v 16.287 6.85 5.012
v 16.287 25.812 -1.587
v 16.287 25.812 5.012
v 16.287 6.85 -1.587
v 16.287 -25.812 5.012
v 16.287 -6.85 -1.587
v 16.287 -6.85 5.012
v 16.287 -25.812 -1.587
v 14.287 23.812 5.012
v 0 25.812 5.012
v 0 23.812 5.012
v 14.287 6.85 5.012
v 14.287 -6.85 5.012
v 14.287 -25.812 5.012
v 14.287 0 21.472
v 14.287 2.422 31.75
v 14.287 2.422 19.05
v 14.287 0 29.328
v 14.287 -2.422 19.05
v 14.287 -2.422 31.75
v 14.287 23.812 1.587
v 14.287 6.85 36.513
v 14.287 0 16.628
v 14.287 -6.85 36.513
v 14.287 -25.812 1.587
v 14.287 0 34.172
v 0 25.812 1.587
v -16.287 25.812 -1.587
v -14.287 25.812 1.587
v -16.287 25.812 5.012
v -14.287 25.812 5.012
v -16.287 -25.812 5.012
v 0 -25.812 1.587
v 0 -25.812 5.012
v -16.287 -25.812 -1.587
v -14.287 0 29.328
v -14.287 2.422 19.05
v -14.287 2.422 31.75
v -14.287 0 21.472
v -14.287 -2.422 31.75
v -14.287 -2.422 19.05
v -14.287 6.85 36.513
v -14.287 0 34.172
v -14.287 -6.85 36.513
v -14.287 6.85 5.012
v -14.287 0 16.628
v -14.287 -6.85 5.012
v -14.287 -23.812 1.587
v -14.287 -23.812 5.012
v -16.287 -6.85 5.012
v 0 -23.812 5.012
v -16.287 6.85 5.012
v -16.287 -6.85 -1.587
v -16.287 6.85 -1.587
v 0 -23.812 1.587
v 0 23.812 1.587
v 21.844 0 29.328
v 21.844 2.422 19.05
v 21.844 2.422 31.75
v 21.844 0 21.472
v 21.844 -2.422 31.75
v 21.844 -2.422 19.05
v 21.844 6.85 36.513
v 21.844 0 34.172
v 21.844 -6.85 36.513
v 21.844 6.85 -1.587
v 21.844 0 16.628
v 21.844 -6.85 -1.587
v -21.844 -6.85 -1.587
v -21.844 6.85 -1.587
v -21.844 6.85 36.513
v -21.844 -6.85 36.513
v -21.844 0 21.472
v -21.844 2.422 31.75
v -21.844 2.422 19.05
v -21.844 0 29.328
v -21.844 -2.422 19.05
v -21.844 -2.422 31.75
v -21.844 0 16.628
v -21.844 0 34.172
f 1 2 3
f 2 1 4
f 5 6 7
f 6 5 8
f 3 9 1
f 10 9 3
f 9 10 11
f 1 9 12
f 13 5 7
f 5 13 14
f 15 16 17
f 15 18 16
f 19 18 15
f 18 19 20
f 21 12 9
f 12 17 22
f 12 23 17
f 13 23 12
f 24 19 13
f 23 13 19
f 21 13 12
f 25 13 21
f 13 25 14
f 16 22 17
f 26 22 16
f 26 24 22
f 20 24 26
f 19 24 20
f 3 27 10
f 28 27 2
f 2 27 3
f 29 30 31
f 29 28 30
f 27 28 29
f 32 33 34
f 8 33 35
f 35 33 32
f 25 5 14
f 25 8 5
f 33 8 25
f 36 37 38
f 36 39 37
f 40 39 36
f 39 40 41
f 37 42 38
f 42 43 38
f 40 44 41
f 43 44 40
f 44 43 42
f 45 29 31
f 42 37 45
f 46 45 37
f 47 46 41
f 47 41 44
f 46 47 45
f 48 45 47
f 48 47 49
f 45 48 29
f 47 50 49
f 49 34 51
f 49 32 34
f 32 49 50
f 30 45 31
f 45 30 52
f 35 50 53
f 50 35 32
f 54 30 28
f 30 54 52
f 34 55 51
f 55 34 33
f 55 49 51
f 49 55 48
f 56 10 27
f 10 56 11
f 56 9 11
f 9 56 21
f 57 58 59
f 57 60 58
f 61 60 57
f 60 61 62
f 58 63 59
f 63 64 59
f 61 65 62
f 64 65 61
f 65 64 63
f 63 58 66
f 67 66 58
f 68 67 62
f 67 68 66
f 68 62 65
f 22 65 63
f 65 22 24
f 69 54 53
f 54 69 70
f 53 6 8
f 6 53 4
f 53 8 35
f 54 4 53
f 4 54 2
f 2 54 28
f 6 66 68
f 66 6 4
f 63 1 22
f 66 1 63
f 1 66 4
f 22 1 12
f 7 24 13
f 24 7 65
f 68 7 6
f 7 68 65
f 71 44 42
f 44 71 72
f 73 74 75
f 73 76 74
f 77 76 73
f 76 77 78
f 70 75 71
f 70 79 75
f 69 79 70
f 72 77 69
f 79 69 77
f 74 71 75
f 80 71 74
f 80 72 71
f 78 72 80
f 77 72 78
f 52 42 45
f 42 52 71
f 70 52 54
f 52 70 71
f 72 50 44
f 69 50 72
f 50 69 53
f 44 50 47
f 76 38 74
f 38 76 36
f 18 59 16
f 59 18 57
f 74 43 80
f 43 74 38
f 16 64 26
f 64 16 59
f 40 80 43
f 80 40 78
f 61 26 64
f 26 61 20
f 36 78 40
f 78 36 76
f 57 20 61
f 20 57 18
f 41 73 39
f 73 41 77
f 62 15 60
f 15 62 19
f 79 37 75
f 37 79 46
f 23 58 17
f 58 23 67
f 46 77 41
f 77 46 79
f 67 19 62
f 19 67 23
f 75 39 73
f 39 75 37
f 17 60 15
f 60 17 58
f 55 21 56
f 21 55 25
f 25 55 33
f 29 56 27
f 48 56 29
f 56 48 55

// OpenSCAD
// file: common.scad
// this contains functions and parameters common to both arm and hub files.

// converts x in inches to x in mm.
function i2mm(x) = x * 0.0254 * 1000;

// distance from hub center to first arm mount point. must be less than second arm mount point.
function first_mount_radius() = i2mm(1);

// distance from hub center to second arm mount point. must be greater than first arm mount point.
function second_mount_radius() = i2mm(2);

// diameter of hole for fasteners between arm and hub.
function hole_diam() = i2mm(1/8) + 0.25;

function arm_width() = i2mm(0.5);

// thickness of each of the 2 hub plates.
function hub_thickness() = i2mm(.25);

// thickness of each of arm plate.
function arm_thickness() = i2mm(0.25);

// distance between general-purpose mounting holes arranged in a square.
function gp_mount_dim() = i2mm(0.75);

// minimum distance to edge from general-purpose mounting holes.
function gp_mount_margin() = i2mm(0.125);

// overall width of pixhawk mount.
// nice to have all general-purpose modules (e.g. telemetry, gps, pixhawk) the same to avoid needing extra spacers for connecting them all to side struts.
function gp_module_width() = i2mm();

// makes the spacer that accomodates 1 arm plate and 1 hub plate.
module spacer() {
    // shell thickness of spacer that separates the motor from the top surface arm.
    spacer_thickness = 2;
    difference() {
        h = hub_thickness() + arm_thickness();
        od = hole_diam() + 2 * spacer_thickness;
        cube([od, od, h], center = true);
        id = hole_diam();
        cube([id, id, 2 * h], center = true);
    }
}
// main file
// Units are mm.

// Holds a HolyBro Telemetry Radio.
// Holes on the side can be used to mount bars that connect to the main mount.

use <common.scad>;

thickness = i2mm(0.125); // thickness of base plate, to which the hub is mounted.

telem_width = i2mm(1 + 1/8);
telem_length = i2mm(1 + 7/8);

wall_thickness = 2;
side_wall_height = i2mm(1/8);
tip_wall_height = i2mm(1/8);

module walls() {
    fudge = 0.5;
    translate([wall_thickness / 2 + telem_width / 2, 0, side_wall_height / 2])
        cube(size = [wall_thickness, telem_length + wall_thickness * 2, side_wall_height + fudge], center = true);
    translate([-wall_thickness / 2 - telem_width / 2, 0, side_wall_height / 2])
        cube(size = [wall_thickness, telem_length + wall_thickness * 2, side_wall_height + fudge], center = true);
    translate([-telem_width / 4, -wall_thickness / 2 - telem_length / 2, tip_wall_height / 2])
        cube(size = [telem_width / 2, wall_thickness, tip_wall_height + fudge], center = true);
    translate([telem_width / 4, wall_thickness / 2 + telem_length / 2, tip_wall_height / 2])
        cube(size = [telem_width / 2, wall_thickness, tip_wall_height + fudge], center = true);
}

module mount_pillars() {
    z = i2mm(1);
    dz =  i2mm(.5);
    h = 3 * dz;
    w = 4 * hole_diam();
    pixhawk_width = i2mm(1 + 9/16);
    extension = pixhawk_width / 2 - telem_width / 2;
    difference() {
        union() {
            translate([telem_width / 2 + wall_thickness / 2 + extension / 2, 0, h / 2 - thickness / 2])
                cube(size = [extension + wall_thickness, w, h], center = true);
            translate([-(telem_width / 2 + wall_thickness / 2 + extension / 2), 0, h / 2 - thickness / 2])
                cube(size = [extension + wall_thickness, w, h], center = true);
        }
        translate([0, 0, z + dz / 2])
            rotate([45, 0, 0])
                cube(size = [telem_width * 2, hole_diam(), hole_diam()], center = true);
        translate([0, 0, z - dz / 2])
            rotate([45, 0, 0])
                cube(size = [telem_width * 2, hole_diam(), hole_diam()], center = true);
    }
}

difference() {
    union() {
        translate([0, 0, thickness / 2])
            walls();
        // main block
        cube(size = [telem_width + wall_thickness * 2, telem_length + wall_thickness * 2, thickness], center = true);
        mount_pillars();
    }
}
